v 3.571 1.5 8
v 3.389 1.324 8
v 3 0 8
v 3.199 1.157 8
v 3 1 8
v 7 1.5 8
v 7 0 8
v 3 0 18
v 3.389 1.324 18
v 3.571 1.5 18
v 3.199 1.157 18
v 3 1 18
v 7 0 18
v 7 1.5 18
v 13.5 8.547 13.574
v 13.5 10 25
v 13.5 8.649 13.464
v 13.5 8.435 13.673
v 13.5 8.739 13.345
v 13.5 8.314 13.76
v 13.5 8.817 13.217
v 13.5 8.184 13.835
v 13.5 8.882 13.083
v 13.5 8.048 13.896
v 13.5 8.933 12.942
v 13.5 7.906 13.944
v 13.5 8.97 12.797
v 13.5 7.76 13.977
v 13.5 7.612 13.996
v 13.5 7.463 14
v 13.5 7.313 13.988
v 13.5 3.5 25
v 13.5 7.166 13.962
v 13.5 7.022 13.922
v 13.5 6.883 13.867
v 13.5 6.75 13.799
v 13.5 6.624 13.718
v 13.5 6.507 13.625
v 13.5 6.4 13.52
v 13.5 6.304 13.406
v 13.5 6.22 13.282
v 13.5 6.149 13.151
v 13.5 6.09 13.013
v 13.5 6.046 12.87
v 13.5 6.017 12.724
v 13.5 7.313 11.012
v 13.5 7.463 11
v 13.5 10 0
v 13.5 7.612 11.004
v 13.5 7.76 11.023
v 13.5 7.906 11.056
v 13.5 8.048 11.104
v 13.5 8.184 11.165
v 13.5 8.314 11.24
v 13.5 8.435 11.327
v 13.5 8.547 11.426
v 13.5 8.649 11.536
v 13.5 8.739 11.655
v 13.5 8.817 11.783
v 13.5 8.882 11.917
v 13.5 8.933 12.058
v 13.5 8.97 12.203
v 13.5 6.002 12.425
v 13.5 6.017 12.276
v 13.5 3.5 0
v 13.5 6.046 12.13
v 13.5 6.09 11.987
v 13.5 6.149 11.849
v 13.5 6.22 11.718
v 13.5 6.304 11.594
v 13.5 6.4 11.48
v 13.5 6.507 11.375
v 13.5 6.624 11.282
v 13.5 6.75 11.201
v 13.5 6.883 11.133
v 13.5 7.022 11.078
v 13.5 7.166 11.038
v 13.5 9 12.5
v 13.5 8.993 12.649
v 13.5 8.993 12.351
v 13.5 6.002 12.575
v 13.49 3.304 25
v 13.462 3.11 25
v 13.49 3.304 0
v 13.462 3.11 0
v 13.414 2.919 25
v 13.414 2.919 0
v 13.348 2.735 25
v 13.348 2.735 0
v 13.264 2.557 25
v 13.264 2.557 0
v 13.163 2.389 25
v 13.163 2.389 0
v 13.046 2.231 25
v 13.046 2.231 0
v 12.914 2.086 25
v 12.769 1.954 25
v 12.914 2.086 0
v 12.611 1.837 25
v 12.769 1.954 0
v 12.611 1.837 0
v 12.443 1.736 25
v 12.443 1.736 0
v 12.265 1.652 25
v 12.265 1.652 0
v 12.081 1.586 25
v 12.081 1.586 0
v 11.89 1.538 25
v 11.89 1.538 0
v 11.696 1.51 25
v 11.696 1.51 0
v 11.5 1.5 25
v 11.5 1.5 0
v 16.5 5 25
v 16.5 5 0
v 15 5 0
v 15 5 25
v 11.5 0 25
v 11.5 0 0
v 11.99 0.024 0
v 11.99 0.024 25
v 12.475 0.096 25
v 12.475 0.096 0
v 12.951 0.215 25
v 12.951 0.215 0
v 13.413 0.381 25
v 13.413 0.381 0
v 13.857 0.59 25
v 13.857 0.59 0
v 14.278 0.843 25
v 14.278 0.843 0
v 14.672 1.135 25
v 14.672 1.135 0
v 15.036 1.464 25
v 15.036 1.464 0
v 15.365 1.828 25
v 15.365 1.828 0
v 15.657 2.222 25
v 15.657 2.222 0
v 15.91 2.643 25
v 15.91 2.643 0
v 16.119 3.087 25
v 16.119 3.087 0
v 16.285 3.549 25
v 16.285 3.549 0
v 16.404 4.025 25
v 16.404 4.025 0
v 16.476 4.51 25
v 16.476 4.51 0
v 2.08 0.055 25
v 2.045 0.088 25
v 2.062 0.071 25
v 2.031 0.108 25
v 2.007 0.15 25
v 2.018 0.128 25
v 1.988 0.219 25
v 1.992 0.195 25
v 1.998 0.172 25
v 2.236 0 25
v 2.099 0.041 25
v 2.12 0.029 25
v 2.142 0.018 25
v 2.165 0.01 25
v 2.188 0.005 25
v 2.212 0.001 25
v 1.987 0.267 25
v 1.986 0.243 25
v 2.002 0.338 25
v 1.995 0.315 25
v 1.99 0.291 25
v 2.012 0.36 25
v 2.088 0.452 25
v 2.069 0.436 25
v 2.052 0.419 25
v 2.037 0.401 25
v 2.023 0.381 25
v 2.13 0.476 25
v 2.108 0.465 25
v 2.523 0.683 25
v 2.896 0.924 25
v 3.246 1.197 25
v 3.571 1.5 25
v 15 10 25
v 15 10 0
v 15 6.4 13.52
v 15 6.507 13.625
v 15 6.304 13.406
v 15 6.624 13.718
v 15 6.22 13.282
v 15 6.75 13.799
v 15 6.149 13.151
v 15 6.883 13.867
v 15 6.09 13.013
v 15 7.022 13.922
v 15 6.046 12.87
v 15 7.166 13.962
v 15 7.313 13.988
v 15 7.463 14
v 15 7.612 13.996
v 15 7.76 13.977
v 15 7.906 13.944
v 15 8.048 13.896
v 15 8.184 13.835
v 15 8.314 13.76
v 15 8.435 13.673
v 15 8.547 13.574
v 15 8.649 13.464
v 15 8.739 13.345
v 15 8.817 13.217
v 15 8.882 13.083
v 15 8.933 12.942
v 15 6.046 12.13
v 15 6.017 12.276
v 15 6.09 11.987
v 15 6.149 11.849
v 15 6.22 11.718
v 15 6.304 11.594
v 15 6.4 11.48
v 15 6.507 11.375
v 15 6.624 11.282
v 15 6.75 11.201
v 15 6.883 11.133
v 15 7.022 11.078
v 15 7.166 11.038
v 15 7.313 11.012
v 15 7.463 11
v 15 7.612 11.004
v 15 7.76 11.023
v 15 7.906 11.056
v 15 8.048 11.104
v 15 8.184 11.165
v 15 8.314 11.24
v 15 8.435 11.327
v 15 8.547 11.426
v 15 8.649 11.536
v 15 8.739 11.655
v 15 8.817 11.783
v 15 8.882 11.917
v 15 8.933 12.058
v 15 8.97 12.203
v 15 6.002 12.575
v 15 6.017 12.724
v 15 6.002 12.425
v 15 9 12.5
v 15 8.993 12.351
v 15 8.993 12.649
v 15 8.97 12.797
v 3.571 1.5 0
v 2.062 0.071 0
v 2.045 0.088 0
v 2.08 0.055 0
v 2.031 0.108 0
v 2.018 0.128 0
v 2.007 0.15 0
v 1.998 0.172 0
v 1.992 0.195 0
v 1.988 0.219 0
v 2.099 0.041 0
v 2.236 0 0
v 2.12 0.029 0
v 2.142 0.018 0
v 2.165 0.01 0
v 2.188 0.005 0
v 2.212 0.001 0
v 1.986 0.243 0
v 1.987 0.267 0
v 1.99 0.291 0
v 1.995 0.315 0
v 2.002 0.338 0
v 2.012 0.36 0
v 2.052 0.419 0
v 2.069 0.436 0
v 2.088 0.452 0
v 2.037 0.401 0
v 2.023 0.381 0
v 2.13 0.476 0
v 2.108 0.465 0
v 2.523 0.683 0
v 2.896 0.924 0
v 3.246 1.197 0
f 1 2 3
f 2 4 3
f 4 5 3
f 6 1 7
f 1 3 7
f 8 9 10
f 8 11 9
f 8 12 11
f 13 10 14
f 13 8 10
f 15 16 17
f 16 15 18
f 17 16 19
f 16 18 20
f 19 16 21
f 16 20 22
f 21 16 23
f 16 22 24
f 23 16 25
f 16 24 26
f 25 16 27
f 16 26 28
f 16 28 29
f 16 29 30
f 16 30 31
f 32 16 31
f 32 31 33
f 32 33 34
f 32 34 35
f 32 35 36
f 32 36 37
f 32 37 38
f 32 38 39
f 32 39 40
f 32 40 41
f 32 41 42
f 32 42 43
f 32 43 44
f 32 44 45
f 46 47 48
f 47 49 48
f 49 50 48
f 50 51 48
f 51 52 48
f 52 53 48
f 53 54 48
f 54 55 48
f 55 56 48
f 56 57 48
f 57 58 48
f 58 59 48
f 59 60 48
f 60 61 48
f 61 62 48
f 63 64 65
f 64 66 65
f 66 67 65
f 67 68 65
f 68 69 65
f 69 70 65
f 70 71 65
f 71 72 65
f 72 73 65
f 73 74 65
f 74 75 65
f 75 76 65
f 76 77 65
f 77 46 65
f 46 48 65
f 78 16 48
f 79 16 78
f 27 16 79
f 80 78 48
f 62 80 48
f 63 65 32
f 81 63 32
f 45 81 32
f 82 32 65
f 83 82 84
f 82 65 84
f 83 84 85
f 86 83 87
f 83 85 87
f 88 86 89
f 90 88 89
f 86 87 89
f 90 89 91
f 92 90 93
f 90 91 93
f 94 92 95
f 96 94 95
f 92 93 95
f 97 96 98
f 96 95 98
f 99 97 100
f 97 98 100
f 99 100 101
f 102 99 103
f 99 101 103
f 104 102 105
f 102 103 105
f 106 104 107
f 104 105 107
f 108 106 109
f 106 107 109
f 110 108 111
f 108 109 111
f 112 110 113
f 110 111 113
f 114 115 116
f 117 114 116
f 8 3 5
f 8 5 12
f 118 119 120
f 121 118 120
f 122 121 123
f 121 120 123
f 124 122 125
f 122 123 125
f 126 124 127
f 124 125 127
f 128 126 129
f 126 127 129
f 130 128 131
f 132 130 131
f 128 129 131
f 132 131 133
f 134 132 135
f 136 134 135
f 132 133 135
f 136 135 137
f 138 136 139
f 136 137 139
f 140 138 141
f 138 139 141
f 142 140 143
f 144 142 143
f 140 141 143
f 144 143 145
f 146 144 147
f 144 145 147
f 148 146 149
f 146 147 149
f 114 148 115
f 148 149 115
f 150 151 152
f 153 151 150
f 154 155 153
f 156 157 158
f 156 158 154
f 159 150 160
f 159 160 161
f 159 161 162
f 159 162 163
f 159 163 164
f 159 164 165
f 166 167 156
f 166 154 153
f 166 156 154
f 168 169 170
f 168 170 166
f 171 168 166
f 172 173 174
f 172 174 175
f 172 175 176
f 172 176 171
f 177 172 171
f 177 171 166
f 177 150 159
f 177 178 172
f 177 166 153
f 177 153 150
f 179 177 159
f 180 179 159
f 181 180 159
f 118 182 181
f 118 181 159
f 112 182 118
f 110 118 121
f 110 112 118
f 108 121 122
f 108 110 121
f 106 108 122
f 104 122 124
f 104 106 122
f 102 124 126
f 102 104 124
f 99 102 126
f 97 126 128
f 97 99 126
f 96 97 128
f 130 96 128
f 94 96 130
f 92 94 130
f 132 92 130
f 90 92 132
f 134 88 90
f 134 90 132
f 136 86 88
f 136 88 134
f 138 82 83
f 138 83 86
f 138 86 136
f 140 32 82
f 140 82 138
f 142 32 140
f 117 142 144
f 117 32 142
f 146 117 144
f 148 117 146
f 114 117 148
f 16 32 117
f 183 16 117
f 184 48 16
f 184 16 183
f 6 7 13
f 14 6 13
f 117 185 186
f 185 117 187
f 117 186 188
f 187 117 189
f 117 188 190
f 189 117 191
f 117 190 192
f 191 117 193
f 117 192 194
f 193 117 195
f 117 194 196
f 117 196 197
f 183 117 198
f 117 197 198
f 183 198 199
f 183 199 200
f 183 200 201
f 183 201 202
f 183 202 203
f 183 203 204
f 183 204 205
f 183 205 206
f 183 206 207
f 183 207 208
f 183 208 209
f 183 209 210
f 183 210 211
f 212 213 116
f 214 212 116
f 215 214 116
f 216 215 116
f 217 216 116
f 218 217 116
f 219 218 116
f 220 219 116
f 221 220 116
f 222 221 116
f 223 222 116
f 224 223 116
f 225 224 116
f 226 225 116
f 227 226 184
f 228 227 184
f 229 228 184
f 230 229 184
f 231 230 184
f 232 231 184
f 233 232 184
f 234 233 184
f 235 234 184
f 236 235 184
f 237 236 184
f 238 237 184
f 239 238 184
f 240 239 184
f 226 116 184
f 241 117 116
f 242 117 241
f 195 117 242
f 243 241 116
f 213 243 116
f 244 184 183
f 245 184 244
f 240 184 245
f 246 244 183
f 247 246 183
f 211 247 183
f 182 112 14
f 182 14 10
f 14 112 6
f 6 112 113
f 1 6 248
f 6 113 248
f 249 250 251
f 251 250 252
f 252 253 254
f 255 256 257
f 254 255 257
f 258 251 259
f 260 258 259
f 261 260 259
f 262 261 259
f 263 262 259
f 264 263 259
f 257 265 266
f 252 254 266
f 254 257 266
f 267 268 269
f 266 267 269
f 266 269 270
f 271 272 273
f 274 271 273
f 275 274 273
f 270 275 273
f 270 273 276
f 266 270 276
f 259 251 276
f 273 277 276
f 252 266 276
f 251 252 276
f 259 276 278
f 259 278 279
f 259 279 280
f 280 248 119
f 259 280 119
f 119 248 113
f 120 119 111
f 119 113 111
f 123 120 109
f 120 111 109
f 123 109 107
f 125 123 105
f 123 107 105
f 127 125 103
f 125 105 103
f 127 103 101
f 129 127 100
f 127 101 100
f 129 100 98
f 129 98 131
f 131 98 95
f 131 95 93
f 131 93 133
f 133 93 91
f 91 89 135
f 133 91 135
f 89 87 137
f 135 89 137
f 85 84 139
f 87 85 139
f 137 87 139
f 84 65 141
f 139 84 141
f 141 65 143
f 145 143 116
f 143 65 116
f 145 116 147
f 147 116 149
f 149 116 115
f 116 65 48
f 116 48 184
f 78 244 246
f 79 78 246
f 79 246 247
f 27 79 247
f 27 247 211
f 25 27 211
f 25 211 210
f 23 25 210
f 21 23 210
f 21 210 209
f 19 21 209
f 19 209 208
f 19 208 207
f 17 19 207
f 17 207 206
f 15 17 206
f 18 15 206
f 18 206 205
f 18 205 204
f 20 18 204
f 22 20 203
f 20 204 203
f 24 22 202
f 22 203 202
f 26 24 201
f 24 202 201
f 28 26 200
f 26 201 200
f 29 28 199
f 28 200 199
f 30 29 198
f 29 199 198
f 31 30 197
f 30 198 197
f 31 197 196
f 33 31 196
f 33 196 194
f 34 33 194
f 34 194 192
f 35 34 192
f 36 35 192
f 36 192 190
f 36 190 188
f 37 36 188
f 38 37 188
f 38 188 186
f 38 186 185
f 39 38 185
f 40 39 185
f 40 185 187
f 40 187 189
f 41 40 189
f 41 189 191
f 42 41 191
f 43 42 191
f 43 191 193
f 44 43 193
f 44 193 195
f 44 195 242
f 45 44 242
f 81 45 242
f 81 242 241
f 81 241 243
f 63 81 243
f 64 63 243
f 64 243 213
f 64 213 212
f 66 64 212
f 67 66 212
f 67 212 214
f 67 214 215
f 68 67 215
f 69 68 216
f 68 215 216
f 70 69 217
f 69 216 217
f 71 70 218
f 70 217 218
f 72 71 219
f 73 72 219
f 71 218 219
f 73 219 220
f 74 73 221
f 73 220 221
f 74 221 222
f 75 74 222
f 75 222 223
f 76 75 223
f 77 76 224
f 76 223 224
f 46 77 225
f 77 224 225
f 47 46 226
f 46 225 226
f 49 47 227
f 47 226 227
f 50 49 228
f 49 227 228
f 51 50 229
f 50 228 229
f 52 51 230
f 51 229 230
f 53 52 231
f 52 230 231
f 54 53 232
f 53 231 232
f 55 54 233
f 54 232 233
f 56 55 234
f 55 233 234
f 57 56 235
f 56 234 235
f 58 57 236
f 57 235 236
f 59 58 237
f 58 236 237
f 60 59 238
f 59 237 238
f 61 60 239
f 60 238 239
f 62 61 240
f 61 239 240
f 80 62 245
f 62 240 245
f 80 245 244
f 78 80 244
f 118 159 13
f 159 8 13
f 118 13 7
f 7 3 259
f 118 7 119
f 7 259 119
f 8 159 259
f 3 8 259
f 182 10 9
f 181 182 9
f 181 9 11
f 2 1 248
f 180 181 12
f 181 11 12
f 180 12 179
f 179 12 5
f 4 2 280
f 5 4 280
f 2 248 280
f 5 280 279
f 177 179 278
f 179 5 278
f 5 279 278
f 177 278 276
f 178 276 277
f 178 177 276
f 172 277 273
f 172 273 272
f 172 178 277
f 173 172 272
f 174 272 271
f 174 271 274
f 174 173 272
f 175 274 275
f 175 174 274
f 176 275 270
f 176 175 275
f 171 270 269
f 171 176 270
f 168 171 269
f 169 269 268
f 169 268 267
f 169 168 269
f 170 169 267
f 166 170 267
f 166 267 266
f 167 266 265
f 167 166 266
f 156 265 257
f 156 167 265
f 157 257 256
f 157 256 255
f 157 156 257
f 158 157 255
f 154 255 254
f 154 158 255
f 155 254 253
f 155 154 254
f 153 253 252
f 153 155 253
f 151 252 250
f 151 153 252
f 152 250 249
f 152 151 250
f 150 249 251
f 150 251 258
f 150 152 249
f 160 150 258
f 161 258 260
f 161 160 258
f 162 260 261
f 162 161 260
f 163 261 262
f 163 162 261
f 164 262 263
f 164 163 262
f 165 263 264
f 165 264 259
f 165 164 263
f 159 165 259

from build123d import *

# Parameters (mm, degrees)
F0_W     = 1.5
F0_H     = 5
F1_DEPTH = 25
F2_R     = 1.5
F3_DEPTH = 25
F4_W     = 4
F4_H     = 10
F5_DEPTH = 25
F6_R     = 0.25


with BuildPart() as f1:
    # F0 (on Top) → F1 (new body)
    with BuildSketch(Plane.XY):
        with BuildLine():
            ThreePointArc((3.570714, 1.5), (1.936492, 0.390228), (0, 0))
            Line((0, 0), (11.5, 0))
            ThreePointArc((11.5, 0), (15.035534, 1.464466), (16.5, 5))
            Line((16.5, 5), (15, 5))
            Line((15, 5), (13.5, 5))
            Line((13.5, 5), (13.5, 3.5))
            ThreePointArc((13.5, 3.5), (12.914214, 2.085786), (11.5, 1.5))
            Line((11.5, 1.5), (10, 1.5))
            Line((10, 1.5), (3.570714, 1.5))
        make_face()
        with Locations((14.25, 7.5)):
            Rectangle(F0_W, F0_H)
    extrude(amount=F1_DEPTH)

    # F2 (on face) → F3 (cut)
    with BuildSketch(Plane.YZ.offset(15)):
        with Locations((7.5, 12.5)):
            Circle(F2_R)
    extrude(amount=-F3_DEPTH, mode=Mode.SUBTRACT)

    # F4 (on face) → F5 (cut)
    with BuildSketch(Plane.XZ):
        with Locations((5, 13)):
            Rectangle(F4_W, F4_H)
    extrude(amount=-F5_DEPTH, mode=Mode.SUBTRACT)

    # F6
    f6_edges = [f1.edges().sort_by_distance(p)[0] for p in [
        (0, 0, 12.5),
    ]]
    fillet(f6_edges, radius=F6_R)


solid = f1.part
